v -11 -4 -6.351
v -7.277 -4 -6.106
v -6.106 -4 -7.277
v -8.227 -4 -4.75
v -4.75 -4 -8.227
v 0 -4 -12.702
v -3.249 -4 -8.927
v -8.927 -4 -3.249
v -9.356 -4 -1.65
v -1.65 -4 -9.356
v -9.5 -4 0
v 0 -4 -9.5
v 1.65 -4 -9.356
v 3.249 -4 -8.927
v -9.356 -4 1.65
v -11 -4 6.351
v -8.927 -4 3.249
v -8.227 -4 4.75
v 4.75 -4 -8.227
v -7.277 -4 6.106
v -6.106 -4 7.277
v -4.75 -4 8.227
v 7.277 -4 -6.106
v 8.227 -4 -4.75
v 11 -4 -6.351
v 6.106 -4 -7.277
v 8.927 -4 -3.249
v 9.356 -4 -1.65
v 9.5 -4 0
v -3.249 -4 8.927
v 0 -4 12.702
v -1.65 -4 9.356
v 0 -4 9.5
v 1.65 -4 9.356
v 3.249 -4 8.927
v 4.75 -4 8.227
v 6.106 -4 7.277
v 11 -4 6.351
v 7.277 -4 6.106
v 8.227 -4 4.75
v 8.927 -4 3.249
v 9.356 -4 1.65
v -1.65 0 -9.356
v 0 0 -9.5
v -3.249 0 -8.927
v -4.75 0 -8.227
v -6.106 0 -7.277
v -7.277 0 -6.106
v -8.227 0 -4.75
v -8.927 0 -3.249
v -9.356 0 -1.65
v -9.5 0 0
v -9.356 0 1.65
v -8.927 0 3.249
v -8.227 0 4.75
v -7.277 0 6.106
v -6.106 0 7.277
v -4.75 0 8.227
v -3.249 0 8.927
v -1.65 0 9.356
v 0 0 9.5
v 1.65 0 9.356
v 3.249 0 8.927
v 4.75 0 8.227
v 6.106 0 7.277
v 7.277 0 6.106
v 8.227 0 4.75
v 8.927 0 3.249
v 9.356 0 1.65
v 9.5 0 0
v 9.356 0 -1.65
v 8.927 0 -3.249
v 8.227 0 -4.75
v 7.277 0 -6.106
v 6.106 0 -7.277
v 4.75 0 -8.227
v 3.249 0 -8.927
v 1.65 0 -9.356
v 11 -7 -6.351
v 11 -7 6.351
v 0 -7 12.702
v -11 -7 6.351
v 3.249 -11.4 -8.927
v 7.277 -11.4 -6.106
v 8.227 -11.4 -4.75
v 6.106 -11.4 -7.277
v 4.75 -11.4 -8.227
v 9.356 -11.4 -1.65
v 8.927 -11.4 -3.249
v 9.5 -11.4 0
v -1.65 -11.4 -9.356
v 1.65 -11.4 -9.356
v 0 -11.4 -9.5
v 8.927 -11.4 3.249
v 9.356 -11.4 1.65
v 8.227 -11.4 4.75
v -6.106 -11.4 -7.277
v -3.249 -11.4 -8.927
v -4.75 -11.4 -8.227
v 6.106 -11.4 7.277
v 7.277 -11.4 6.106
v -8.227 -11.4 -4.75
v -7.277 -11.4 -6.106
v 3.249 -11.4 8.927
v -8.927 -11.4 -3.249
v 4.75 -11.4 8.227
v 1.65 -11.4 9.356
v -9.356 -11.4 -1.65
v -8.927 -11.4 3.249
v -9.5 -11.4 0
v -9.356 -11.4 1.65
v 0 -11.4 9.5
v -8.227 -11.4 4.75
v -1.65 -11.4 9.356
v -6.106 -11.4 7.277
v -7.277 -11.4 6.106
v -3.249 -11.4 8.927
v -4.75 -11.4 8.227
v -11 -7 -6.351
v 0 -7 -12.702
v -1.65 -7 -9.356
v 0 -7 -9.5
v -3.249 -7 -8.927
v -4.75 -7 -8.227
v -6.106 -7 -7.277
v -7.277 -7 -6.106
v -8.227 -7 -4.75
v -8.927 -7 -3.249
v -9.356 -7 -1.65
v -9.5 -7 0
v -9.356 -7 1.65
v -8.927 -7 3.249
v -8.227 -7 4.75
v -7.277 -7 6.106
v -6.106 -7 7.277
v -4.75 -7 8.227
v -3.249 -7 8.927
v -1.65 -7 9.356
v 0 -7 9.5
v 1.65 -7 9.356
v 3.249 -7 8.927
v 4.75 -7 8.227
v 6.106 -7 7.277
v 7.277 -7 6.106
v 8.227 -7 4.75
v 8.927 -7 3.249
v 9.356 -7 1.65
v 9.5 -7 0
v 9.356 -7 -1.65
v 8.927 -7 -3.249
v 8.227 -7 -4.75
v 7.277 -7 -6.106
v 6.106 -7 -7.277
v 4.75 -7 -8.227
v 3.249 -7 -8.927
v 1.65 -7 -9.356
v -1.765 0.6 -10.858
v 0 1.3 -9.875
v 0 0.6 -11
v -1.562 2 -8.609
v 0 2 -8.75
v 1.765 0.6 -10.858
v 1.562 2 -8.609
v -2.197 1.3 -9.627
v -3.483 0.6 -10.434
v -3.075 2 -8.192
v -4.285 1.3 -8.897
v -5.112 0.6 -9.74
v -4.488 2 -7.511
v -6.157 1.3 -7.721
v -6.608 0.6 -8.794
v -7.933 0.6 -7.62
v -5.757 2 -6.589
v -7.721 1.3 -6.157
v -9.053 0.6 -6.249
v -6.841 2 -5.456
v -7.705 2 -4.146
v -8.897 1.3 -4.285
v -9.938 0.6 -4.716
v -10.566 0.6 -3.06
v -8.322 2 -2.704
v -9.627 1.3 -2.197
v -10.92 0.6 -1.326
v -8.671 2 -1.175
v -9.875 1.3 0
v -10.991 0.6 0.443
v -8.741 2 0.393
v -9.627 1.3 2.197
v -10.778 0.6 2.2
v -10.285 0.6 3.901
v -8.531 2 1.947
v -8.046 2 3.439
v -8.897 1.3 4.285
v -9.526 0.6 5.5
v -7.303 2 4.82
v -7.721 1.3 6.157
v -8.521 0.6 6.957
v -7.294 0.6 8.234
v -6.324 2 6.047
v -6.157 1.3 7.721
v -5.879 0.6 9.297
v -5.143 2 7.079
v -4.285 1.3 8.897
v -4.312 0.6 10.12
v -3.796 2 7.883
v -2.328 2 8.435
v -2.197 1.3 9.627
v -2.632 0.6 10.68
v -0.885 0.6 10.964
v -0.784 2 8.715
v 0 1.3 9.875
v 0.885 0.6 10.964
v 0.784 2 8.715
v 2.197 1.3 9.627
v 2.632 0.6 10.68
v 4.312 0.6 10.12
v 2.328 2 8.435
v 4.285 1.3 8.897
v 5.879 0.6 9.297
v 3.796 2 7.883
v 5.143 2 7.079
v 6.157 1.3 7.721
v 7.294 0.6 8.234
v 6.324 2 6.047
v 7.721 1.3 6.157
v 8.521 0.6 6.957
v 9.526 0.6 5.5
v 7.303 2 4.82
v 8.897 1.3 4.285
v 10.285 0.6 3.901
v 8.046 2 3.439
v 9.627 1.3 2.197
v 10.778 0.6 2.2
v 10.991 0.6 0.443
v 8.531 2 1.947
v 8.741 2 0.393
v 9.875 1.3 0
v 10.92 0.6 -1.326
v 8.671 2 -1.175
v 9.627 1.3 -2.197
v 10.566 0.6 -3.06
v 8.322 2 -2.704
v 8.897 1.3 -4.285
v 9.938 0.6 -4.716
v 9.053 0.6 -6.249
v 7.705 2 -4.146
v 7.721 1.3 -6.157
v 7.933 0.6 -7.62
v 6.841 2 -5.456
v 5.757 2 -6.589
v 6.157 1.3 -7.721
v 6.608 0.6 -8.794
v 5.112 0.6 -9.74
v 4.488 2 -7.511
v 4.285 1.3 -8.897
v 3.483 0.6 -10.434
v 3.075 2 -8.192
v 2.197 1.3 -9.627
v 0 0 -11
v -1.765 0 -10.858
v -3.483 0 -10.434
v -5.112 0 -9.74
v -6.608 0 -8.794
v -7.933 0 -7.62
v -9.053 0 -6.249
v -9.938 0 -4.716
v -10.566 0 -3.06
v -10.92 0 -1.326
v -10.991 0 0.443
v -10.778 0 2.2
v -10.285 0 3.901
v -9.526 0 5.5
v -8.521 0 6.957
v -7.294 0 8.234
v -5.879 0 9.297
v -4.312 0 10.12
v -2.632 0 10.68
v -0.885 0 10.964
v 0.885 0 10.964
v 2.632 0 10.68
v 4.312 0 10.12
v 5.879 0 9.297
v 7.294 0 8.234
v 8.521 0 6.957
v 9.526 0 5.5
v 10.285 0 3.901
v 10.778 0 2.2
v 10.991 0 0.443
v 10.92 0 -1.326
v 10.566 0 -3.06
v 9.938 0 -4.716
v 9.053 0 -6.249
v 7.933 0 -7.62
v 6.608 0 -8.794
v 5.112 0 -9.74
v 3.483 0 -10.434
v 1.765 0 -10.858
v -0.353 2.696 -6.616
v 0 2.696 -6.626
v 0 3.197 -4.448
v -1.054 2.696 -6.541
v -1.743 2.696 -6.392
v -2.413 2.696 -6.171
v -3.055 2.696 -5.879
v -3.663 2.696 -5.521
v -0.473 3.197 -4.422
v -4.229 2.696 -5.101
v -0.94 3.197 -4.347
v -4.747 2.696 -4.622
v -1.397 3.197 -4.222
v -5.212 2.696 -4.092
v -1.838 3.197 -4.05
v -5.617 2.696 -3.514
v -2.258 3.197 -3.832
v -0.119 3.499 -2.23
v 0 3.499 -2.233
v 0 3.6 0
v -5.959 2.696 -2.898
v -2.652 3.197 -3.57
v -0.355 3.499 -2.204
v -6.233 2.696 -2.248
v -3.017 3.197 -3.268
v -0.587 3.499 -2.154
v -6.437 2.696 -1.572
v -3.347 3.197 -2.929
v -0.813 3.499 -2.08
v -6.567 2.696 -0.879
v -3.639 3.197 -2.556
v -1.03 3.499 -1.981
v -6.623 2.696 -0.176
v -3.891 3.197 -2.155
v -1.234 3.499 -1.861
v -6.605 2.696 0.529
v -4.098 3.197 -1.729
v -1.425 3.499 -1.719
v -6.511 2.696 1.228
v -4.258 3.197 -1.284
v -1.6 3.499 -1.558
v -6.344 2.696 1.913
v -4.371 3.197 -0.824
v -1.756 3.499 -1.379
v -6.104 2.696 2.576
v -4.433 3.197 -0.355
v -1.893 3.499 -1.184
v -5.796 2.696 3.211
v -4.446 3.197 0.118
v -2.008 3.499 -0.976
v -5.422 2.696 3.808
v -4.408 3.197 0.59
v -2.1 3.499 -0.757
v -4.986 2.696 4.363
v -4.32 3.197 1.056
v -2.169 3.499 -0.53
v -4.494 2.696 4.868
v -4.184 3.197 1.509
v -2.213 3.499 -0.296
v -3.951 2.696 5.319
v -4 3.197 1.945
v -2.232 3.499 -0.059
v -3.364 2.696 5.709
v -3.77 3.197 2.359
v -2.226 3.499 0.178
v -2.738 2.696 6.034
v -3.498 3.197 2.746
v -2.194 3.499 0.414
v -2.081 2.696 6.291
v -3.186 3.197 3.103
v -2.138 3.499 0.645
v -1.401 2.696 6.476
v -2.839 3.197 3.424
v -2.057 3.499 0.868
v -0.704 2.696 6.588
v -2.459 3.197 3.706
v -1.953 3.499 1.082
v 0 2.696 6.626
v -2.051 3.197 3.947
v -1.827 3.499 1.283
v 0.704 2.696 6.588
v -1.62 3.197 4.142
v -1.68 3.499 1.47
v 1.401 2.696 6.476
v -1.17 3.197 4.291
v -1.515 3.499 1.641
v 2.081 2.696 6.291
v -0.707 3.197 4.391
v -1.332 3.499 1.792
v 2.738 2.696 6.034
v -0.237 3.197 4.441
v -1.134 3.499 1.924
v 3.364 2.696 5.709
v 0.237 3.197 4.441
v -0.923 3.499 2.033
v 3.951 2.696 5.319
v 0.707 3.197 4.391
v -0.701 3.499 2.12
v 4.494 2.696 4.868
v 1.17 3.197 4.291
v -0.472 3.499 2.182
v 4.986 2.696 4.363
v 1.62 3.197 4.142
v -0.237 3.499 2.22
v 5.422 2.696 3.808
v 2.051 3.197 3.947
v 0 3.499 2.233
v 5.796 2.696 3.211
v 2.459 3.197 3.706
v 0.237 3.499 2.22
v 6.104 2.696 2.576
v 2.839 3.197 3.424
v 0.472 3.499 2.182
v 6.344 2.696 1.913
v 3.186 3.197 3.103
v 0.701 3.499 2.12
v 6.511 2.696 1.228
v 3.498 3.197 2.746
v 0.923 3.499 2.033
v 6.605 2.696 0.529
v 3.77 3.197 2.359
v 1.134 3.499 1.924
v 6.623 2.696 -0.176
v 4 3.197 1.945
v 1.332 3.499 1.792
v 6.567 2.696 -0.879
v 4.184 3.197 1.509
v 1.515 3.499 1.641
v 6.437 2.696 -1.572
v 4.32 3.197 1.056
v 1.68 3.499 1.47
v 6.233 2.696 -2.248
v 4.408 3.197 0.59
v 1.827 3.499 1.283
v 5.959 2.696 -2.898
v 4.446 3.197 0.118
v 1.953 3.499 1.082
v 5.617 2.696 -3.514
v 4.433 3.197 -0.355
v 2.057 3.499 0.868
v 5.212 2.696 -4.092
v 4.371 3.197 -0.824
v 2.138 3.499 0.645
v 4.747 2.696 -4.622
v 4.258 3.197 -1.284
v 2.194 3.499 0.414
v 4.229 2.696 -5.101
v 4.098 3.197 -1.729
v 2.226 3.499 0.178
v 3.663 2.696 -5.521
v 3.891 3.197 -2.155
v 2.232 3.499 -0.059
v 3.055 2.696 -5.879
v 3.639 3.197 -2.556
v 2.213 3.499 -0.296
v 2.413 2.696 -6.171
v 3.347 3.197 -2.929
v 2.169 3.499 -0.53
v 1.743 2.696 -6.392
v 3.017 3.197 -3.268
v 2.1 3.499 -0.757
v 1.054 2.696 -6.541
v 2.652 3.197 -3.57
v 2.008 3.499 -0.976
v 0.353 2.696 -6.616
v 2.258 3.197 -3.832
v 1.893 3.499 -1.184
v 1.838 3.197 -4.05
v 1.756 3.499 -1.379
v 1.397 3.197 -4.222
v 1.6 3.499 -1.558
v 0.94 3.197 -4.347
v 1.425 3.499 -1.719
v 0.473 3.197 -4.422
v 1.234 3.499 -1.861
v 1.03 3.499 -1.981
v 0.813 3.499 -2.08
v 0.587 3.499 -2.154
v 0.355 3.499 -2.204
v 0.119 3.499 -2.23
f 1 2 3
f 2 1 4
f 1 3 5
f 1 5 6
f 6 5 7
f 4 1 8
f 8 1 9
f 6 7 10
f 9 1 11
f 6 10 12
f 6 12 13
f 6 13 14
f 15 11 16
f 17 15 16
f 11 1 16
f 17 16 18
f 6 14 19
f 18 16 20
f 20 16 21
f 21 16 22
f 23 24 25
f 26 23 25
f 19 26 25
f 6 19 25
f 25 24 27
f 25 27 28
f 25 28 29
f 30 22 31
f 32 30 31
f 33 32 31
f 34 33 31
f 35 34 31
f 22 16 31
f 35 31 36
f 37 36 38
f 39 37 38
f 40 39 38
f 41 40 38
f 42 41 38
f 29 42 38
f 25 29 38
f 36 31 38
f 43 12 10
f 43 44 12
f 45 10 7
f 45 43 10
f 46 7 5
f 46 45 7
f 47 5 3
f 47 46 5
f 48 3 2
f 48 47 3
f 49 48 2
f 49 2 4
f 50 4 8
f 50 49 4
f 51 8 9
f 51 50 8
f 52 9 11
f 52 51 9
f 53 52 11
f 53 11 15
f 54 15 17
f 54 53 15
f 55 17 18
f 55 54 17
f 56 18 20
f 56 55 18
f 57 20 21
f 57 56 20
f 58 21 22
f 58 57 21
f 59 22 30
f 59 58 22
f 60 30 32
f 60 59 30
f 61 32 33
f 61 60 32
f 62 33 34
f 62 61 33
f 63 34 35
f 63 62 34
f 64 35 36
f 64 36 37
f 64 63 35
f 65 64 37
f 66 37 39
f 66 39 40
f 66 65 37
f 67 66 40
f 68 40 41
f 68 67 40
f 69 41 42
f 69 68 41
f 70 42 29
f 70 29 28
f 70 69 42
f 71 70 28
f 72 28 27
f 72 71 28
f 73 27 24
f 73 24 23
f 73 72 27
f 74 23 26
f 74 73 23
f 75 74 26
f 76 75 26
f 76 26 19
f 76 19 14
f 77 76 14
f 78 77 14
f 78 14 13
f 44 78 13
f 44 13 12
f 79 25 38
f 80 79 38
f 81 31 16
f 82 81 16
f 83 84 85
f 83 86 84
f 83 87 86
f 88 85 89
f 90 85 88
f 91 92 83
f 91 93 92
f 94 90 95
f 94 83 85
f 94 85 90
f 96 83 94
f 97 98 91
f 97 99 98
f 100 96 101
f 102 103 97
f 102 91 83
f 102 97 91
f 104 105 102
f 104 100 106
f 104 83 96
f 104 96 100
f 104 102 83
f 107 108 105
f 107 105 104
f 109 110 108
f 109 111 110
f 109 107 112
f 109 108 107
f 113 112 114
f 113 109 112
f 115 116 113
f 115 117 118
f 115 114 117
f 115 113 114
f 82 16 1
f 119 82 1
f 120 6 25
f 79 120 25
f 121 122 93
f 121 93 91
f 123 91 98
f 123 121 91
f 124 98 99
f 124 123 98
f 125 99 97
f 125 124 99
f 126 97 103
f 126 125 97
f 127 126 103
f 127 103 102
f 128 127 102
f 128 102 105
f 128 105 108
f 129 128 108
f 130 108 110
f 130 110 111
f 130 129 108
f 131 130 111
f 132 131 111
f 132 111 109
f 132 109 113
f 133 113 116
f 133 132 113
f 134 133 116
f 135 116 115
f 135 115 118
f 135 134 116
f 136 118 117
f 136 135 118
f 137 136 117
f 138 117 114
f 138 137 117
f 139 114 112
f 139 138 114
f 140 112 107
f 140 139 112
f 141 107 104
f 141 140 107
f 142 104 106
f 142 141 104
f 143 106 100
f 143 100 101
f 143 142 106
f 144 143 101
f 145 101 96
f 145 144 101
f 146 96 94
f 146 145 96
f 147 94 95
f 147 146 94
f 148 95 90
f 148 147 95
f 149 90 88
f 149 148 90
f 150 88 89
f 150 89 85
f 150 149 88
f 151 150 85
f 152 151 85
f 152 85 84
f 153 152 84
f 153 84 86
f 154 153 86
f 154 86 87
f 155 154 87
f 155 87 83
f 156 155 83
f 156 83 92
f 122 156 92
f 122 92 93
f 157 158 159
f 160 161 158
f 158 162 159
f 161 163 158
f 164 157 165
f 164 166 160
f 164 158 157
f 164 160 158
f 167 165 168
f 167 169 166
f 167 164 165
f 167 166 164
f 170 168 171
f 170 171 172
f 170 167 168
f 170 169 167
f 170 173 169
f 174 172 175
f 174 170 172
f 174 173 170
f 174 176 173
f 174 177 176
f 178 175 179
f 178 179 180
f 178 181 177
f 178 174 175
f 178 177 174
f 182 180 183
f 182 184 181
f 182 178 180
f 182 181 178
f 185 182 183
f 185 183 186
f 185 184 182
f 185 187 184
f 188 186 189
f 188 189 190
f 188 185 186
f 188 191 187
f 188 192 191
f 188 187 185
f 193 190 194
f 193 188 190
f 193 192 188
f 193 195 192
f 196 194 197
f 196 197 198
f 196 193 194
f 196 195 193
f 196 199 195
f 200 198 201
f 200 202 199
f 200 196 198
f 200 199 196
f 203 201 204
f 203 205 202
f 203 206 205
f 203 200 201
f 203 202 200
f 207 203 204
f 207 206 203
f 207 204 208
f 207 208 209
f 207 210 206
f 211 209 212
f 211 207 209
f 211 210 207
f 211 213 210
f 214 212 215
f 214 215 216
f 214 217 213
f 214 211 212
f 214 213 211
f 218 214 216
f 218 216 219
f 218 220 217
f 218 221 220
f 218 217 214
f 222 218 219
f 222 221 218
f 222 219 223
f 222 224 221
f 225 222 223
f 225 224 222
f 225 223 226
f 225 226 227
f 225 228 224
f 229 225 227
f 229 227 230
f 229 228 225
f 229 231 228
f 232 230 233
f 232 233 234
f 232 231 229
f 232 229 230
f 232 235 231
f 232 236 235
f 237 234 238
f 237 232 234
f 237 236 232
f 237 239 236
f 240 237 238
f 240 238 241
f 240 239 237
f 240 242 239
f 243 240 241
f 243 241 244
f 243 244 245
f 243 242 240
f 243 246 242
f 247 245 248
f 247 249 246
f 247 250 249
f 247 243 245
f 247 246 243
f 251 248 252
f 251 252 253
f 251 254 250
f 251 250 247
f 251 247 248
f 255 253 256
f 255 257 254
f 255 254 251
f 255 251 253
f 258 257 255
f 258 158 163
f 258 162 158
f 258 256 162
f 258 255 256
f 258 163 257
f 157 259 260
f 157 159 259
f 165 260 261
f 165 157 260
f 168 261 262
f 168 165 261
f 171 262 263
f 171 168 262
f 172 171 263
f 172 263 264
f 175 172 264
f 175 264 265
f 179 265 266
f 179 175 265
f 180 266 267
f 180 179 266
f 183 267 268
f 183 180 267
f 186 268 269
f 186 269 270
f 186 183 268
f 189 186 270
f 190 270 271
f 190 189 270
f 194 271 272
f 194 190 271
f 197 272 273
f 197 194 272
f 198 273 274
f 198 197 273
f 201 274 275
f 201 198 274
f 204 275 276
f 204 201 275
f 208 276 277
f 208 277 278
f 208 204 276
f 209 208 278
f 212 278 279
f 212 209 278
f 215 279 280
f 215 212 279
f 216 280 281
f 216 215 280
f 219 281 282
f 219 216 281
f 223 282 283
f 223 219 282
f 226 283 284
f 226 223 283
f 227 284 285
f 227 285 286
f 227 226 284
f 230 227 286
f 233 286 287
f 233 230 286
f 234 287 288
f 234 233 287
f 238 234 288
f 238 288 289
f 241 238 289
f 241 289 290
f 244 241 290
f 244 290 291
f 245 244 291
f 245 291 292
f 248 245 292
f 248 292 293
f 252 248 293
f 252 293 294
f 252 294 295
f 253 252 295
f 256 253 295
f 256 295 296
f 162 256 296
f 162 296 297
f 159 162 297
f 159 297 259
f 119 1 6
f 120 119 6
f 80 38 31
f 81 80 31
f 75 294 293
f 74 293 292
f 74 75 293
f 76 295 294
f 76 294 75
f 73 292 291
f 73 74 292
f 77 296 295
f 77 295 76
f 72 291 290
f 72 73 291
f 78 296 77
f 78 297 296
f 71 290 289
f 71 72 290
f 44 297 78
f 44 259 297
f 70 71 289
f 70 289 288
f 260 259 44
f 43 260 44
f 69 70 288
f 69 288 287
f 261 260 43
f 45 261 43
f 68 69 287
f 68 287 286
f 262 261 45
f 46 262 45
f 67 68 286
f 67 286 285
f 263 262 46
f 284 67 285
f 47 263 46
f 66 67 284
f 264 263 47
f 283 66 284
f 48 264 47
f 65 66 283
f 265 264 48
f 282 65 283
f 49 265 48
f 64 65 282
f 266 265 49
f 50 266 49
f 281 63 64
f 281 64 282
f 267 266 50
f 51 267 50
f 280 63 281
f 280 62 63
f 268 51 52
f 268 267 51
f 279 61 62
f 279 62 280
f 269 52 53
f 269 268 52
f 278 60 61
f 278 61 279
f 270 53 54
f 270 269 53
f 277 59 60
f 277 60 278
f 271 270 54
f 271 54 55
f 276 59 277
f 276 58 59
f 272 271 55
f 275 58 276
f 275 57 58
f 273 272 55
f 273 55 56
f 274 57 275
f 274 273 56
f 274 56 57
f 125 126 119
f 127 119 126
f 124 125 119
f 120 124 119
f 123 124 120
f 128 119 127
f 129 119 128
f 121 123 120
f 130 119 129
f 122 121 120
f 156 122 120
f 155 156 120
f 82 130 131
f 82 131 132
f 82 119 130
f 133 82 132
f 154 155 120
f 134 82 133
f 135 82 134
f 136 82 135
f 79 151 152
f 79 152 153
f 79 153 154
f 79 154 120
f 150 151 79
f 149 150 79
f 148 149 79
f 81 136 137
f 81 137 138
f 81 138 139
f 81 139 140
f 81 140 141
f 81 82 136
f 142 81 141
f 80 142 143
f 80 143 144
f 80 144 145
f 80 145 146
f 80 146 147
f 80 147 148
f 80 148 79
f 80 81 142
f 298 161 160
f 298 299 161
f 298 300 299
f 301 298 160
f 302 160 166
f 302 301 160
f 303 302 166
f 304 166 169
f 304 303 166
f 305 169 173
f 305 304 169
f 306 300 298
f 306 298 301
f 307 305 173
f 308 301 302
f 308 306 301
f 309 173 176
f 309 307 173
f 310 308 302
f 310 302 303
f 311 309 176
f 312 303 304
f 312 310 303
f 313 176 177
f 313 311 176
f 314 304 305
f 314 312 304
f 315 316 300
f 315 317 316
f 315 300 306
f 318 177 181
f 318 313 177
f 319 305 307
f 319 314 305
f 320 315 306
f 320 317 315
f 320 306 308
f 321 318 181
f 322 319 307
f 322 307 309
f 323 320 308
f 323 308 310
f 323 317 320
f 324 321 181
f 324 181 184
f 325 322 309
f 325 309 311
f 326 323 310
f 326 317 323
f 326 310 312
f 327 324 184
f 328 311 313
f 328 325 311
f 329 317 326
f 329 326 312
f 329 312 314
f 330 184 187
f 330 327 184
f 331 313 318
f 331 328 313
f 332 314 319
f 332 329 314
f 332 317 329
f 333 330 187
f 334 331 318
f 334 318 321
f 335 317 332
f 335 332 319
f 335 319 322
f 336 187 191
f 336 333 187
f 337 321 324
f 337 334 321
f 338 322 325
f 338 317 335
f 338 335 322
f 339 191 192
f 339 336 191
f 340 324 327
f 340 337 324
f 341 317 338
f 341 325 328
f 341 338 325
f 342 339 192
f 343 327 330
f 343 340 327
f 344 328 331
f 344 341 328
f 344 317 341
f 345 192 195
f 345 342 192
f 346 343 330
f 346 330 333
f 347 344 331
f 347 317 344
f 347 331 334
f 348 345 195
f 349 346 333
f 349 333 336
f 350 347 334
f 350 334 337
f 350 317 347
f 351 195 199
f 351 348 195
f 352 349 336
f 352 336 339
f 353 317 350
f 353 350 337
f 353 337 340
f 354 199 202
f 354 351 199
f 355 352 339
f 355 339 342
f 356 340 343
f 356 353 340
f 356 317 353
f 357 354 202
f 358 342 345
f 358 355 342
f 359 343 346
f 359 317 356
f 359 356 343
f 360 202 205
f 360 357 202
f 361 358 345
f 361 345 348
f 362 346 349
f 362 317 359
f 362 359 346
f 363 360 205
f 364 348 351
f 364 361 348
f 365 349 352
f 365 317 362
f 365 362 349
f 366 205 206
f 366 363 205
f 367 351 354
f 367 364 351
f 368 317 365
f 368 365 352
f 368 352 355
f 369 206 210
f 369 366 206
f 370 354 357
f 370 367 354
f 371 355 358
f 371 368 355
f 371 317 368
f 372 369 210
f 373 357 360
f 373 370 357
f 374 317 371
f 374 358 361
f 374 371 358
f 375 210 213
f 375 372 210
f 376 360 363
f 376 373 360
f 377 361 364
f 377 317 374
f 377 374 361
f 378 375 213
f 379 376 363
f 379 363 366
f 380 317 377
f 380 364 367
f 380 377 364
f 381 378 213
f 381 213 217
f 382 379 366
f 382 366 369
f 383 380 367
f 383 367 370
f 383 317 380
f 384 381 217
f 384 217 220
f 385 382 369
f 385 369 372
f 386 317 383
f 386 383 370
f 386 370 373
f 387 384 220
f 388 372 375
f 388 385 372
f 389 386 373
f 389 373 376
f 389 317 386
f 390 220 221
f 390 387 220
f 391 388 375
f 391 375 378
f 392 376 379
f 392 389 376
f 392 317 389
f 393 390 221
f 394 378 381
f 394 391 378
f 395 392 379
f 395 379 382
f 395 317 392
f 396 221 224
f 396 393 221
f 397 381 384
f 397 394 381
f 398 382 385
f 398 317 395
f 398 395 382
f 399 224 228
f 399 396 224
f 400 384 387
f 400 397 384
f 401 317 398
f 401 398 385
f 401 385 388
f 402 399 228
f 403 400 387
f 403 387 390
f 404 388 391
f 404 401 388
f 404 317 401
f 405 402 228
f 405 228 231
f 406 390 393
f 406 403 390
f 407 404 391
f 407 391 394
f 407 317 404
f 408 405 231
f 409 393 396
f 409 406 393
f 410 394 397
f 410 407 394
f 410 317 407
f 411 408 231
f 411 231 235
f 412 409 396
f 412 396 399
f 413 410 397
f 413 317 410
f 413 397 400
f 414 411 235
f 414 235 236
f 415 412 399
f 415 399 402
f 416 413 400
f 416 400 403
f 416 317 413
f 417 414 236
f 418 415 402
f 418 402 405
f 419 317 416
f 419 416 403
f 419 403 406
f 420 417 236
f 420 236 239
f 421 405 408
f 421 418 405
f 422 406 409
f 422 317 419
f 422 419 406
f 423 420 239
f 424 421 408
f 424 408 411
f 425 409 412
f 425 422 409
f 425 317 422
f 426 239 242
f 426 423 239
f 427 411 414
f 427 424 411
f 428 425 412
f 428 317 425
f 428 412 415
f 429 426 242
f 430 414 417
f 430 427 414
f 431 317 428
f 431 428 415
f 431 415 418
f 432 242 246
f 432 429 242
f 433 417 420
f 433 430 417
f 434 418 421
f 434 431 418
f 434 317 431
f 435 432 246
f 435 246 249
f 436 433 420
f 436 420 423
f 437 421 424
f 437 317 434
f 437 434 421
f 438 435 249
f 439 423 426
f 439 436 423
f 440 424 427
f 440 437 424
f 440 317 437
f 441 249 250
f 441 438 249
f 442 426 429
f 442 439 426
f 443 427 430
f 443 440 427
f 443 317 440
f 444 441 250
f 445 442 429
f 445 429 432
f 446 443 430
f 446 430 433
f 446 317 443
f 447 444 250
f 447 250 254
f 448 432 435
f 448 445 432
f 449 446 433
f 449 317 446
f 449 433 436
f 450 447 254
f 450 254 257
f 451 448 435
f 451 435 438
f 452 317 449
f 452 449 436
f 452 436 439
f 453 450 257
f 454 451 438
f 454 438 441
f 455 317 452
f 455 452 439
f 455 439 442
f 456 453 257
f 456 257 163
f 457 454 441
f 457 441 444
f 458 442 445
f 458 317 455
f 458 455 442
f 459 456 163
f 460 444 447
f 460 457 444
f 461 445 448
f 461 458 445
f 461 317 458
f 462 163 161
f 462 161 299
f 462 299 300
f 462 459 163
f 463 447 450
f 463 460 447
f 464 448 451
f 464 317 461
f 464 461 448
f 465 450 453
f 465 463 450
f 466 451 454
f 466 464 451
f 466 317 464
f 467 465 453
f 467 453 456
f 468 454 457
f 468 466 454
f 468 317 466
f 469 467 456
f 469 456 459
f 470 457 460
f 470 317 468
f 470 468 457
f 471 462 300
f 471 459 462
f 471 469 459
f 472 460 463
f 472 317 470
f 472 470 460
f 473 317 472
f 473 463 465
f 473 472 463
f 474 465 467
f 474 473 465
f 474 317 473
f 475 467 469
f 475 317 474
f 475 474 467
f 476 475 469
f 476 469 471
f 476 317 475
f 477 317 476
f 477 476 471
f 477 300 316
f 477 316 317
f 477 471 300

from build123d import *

# Parameters (mm, degrees)
BOSS_EXTRUDE2_START = 4
BOSS_EXTRUDE2_DEPTH = 3


with BuildPart() as part:
    # Sketch1 → Revolve1 (revolve)
    with BuildSketch(Plane.XY, mode=Mode.PRIVATE) as revolve1_sk:
        with BuildLine():
            Line((9.5, 0), (11, 0))
            Line((11, 0), (11, 0.6))
            Line((11, 0.6), (8.75, 2))
            ThreePointArc((8.75, 2), (4.447541456, 3.196711086), (0, 3.6))
            Line((0, 3.6), (0, -11.4))
            Line((0, -11.4), (9.5, -11.4))
            Line((9.5, -11.4), (9.5, 0))
        make_face()
    revolve(revolve1_sk.sketch.rotate(Axis((0, 3.6, 0), (0, 1, 0)), 90), axis=Axis((0, 3.6, 0), (0, 1, 0)))

    # Sketch3 → Boss-Extrude2 (add)
    with BuildSketch(Plane.XZ.offset(BOSS_EXTRUDE2_START)):
        Polygon((0, 12.701705922), (-11, 6.350852961), (-11, -6.350852961), (0, -12.701705922), (11, -6.350852961), (11, 6.350852961), align=None)
    extrude(amount=BOSS_EXTRUDE2_DEPTH)


solid = part.part
